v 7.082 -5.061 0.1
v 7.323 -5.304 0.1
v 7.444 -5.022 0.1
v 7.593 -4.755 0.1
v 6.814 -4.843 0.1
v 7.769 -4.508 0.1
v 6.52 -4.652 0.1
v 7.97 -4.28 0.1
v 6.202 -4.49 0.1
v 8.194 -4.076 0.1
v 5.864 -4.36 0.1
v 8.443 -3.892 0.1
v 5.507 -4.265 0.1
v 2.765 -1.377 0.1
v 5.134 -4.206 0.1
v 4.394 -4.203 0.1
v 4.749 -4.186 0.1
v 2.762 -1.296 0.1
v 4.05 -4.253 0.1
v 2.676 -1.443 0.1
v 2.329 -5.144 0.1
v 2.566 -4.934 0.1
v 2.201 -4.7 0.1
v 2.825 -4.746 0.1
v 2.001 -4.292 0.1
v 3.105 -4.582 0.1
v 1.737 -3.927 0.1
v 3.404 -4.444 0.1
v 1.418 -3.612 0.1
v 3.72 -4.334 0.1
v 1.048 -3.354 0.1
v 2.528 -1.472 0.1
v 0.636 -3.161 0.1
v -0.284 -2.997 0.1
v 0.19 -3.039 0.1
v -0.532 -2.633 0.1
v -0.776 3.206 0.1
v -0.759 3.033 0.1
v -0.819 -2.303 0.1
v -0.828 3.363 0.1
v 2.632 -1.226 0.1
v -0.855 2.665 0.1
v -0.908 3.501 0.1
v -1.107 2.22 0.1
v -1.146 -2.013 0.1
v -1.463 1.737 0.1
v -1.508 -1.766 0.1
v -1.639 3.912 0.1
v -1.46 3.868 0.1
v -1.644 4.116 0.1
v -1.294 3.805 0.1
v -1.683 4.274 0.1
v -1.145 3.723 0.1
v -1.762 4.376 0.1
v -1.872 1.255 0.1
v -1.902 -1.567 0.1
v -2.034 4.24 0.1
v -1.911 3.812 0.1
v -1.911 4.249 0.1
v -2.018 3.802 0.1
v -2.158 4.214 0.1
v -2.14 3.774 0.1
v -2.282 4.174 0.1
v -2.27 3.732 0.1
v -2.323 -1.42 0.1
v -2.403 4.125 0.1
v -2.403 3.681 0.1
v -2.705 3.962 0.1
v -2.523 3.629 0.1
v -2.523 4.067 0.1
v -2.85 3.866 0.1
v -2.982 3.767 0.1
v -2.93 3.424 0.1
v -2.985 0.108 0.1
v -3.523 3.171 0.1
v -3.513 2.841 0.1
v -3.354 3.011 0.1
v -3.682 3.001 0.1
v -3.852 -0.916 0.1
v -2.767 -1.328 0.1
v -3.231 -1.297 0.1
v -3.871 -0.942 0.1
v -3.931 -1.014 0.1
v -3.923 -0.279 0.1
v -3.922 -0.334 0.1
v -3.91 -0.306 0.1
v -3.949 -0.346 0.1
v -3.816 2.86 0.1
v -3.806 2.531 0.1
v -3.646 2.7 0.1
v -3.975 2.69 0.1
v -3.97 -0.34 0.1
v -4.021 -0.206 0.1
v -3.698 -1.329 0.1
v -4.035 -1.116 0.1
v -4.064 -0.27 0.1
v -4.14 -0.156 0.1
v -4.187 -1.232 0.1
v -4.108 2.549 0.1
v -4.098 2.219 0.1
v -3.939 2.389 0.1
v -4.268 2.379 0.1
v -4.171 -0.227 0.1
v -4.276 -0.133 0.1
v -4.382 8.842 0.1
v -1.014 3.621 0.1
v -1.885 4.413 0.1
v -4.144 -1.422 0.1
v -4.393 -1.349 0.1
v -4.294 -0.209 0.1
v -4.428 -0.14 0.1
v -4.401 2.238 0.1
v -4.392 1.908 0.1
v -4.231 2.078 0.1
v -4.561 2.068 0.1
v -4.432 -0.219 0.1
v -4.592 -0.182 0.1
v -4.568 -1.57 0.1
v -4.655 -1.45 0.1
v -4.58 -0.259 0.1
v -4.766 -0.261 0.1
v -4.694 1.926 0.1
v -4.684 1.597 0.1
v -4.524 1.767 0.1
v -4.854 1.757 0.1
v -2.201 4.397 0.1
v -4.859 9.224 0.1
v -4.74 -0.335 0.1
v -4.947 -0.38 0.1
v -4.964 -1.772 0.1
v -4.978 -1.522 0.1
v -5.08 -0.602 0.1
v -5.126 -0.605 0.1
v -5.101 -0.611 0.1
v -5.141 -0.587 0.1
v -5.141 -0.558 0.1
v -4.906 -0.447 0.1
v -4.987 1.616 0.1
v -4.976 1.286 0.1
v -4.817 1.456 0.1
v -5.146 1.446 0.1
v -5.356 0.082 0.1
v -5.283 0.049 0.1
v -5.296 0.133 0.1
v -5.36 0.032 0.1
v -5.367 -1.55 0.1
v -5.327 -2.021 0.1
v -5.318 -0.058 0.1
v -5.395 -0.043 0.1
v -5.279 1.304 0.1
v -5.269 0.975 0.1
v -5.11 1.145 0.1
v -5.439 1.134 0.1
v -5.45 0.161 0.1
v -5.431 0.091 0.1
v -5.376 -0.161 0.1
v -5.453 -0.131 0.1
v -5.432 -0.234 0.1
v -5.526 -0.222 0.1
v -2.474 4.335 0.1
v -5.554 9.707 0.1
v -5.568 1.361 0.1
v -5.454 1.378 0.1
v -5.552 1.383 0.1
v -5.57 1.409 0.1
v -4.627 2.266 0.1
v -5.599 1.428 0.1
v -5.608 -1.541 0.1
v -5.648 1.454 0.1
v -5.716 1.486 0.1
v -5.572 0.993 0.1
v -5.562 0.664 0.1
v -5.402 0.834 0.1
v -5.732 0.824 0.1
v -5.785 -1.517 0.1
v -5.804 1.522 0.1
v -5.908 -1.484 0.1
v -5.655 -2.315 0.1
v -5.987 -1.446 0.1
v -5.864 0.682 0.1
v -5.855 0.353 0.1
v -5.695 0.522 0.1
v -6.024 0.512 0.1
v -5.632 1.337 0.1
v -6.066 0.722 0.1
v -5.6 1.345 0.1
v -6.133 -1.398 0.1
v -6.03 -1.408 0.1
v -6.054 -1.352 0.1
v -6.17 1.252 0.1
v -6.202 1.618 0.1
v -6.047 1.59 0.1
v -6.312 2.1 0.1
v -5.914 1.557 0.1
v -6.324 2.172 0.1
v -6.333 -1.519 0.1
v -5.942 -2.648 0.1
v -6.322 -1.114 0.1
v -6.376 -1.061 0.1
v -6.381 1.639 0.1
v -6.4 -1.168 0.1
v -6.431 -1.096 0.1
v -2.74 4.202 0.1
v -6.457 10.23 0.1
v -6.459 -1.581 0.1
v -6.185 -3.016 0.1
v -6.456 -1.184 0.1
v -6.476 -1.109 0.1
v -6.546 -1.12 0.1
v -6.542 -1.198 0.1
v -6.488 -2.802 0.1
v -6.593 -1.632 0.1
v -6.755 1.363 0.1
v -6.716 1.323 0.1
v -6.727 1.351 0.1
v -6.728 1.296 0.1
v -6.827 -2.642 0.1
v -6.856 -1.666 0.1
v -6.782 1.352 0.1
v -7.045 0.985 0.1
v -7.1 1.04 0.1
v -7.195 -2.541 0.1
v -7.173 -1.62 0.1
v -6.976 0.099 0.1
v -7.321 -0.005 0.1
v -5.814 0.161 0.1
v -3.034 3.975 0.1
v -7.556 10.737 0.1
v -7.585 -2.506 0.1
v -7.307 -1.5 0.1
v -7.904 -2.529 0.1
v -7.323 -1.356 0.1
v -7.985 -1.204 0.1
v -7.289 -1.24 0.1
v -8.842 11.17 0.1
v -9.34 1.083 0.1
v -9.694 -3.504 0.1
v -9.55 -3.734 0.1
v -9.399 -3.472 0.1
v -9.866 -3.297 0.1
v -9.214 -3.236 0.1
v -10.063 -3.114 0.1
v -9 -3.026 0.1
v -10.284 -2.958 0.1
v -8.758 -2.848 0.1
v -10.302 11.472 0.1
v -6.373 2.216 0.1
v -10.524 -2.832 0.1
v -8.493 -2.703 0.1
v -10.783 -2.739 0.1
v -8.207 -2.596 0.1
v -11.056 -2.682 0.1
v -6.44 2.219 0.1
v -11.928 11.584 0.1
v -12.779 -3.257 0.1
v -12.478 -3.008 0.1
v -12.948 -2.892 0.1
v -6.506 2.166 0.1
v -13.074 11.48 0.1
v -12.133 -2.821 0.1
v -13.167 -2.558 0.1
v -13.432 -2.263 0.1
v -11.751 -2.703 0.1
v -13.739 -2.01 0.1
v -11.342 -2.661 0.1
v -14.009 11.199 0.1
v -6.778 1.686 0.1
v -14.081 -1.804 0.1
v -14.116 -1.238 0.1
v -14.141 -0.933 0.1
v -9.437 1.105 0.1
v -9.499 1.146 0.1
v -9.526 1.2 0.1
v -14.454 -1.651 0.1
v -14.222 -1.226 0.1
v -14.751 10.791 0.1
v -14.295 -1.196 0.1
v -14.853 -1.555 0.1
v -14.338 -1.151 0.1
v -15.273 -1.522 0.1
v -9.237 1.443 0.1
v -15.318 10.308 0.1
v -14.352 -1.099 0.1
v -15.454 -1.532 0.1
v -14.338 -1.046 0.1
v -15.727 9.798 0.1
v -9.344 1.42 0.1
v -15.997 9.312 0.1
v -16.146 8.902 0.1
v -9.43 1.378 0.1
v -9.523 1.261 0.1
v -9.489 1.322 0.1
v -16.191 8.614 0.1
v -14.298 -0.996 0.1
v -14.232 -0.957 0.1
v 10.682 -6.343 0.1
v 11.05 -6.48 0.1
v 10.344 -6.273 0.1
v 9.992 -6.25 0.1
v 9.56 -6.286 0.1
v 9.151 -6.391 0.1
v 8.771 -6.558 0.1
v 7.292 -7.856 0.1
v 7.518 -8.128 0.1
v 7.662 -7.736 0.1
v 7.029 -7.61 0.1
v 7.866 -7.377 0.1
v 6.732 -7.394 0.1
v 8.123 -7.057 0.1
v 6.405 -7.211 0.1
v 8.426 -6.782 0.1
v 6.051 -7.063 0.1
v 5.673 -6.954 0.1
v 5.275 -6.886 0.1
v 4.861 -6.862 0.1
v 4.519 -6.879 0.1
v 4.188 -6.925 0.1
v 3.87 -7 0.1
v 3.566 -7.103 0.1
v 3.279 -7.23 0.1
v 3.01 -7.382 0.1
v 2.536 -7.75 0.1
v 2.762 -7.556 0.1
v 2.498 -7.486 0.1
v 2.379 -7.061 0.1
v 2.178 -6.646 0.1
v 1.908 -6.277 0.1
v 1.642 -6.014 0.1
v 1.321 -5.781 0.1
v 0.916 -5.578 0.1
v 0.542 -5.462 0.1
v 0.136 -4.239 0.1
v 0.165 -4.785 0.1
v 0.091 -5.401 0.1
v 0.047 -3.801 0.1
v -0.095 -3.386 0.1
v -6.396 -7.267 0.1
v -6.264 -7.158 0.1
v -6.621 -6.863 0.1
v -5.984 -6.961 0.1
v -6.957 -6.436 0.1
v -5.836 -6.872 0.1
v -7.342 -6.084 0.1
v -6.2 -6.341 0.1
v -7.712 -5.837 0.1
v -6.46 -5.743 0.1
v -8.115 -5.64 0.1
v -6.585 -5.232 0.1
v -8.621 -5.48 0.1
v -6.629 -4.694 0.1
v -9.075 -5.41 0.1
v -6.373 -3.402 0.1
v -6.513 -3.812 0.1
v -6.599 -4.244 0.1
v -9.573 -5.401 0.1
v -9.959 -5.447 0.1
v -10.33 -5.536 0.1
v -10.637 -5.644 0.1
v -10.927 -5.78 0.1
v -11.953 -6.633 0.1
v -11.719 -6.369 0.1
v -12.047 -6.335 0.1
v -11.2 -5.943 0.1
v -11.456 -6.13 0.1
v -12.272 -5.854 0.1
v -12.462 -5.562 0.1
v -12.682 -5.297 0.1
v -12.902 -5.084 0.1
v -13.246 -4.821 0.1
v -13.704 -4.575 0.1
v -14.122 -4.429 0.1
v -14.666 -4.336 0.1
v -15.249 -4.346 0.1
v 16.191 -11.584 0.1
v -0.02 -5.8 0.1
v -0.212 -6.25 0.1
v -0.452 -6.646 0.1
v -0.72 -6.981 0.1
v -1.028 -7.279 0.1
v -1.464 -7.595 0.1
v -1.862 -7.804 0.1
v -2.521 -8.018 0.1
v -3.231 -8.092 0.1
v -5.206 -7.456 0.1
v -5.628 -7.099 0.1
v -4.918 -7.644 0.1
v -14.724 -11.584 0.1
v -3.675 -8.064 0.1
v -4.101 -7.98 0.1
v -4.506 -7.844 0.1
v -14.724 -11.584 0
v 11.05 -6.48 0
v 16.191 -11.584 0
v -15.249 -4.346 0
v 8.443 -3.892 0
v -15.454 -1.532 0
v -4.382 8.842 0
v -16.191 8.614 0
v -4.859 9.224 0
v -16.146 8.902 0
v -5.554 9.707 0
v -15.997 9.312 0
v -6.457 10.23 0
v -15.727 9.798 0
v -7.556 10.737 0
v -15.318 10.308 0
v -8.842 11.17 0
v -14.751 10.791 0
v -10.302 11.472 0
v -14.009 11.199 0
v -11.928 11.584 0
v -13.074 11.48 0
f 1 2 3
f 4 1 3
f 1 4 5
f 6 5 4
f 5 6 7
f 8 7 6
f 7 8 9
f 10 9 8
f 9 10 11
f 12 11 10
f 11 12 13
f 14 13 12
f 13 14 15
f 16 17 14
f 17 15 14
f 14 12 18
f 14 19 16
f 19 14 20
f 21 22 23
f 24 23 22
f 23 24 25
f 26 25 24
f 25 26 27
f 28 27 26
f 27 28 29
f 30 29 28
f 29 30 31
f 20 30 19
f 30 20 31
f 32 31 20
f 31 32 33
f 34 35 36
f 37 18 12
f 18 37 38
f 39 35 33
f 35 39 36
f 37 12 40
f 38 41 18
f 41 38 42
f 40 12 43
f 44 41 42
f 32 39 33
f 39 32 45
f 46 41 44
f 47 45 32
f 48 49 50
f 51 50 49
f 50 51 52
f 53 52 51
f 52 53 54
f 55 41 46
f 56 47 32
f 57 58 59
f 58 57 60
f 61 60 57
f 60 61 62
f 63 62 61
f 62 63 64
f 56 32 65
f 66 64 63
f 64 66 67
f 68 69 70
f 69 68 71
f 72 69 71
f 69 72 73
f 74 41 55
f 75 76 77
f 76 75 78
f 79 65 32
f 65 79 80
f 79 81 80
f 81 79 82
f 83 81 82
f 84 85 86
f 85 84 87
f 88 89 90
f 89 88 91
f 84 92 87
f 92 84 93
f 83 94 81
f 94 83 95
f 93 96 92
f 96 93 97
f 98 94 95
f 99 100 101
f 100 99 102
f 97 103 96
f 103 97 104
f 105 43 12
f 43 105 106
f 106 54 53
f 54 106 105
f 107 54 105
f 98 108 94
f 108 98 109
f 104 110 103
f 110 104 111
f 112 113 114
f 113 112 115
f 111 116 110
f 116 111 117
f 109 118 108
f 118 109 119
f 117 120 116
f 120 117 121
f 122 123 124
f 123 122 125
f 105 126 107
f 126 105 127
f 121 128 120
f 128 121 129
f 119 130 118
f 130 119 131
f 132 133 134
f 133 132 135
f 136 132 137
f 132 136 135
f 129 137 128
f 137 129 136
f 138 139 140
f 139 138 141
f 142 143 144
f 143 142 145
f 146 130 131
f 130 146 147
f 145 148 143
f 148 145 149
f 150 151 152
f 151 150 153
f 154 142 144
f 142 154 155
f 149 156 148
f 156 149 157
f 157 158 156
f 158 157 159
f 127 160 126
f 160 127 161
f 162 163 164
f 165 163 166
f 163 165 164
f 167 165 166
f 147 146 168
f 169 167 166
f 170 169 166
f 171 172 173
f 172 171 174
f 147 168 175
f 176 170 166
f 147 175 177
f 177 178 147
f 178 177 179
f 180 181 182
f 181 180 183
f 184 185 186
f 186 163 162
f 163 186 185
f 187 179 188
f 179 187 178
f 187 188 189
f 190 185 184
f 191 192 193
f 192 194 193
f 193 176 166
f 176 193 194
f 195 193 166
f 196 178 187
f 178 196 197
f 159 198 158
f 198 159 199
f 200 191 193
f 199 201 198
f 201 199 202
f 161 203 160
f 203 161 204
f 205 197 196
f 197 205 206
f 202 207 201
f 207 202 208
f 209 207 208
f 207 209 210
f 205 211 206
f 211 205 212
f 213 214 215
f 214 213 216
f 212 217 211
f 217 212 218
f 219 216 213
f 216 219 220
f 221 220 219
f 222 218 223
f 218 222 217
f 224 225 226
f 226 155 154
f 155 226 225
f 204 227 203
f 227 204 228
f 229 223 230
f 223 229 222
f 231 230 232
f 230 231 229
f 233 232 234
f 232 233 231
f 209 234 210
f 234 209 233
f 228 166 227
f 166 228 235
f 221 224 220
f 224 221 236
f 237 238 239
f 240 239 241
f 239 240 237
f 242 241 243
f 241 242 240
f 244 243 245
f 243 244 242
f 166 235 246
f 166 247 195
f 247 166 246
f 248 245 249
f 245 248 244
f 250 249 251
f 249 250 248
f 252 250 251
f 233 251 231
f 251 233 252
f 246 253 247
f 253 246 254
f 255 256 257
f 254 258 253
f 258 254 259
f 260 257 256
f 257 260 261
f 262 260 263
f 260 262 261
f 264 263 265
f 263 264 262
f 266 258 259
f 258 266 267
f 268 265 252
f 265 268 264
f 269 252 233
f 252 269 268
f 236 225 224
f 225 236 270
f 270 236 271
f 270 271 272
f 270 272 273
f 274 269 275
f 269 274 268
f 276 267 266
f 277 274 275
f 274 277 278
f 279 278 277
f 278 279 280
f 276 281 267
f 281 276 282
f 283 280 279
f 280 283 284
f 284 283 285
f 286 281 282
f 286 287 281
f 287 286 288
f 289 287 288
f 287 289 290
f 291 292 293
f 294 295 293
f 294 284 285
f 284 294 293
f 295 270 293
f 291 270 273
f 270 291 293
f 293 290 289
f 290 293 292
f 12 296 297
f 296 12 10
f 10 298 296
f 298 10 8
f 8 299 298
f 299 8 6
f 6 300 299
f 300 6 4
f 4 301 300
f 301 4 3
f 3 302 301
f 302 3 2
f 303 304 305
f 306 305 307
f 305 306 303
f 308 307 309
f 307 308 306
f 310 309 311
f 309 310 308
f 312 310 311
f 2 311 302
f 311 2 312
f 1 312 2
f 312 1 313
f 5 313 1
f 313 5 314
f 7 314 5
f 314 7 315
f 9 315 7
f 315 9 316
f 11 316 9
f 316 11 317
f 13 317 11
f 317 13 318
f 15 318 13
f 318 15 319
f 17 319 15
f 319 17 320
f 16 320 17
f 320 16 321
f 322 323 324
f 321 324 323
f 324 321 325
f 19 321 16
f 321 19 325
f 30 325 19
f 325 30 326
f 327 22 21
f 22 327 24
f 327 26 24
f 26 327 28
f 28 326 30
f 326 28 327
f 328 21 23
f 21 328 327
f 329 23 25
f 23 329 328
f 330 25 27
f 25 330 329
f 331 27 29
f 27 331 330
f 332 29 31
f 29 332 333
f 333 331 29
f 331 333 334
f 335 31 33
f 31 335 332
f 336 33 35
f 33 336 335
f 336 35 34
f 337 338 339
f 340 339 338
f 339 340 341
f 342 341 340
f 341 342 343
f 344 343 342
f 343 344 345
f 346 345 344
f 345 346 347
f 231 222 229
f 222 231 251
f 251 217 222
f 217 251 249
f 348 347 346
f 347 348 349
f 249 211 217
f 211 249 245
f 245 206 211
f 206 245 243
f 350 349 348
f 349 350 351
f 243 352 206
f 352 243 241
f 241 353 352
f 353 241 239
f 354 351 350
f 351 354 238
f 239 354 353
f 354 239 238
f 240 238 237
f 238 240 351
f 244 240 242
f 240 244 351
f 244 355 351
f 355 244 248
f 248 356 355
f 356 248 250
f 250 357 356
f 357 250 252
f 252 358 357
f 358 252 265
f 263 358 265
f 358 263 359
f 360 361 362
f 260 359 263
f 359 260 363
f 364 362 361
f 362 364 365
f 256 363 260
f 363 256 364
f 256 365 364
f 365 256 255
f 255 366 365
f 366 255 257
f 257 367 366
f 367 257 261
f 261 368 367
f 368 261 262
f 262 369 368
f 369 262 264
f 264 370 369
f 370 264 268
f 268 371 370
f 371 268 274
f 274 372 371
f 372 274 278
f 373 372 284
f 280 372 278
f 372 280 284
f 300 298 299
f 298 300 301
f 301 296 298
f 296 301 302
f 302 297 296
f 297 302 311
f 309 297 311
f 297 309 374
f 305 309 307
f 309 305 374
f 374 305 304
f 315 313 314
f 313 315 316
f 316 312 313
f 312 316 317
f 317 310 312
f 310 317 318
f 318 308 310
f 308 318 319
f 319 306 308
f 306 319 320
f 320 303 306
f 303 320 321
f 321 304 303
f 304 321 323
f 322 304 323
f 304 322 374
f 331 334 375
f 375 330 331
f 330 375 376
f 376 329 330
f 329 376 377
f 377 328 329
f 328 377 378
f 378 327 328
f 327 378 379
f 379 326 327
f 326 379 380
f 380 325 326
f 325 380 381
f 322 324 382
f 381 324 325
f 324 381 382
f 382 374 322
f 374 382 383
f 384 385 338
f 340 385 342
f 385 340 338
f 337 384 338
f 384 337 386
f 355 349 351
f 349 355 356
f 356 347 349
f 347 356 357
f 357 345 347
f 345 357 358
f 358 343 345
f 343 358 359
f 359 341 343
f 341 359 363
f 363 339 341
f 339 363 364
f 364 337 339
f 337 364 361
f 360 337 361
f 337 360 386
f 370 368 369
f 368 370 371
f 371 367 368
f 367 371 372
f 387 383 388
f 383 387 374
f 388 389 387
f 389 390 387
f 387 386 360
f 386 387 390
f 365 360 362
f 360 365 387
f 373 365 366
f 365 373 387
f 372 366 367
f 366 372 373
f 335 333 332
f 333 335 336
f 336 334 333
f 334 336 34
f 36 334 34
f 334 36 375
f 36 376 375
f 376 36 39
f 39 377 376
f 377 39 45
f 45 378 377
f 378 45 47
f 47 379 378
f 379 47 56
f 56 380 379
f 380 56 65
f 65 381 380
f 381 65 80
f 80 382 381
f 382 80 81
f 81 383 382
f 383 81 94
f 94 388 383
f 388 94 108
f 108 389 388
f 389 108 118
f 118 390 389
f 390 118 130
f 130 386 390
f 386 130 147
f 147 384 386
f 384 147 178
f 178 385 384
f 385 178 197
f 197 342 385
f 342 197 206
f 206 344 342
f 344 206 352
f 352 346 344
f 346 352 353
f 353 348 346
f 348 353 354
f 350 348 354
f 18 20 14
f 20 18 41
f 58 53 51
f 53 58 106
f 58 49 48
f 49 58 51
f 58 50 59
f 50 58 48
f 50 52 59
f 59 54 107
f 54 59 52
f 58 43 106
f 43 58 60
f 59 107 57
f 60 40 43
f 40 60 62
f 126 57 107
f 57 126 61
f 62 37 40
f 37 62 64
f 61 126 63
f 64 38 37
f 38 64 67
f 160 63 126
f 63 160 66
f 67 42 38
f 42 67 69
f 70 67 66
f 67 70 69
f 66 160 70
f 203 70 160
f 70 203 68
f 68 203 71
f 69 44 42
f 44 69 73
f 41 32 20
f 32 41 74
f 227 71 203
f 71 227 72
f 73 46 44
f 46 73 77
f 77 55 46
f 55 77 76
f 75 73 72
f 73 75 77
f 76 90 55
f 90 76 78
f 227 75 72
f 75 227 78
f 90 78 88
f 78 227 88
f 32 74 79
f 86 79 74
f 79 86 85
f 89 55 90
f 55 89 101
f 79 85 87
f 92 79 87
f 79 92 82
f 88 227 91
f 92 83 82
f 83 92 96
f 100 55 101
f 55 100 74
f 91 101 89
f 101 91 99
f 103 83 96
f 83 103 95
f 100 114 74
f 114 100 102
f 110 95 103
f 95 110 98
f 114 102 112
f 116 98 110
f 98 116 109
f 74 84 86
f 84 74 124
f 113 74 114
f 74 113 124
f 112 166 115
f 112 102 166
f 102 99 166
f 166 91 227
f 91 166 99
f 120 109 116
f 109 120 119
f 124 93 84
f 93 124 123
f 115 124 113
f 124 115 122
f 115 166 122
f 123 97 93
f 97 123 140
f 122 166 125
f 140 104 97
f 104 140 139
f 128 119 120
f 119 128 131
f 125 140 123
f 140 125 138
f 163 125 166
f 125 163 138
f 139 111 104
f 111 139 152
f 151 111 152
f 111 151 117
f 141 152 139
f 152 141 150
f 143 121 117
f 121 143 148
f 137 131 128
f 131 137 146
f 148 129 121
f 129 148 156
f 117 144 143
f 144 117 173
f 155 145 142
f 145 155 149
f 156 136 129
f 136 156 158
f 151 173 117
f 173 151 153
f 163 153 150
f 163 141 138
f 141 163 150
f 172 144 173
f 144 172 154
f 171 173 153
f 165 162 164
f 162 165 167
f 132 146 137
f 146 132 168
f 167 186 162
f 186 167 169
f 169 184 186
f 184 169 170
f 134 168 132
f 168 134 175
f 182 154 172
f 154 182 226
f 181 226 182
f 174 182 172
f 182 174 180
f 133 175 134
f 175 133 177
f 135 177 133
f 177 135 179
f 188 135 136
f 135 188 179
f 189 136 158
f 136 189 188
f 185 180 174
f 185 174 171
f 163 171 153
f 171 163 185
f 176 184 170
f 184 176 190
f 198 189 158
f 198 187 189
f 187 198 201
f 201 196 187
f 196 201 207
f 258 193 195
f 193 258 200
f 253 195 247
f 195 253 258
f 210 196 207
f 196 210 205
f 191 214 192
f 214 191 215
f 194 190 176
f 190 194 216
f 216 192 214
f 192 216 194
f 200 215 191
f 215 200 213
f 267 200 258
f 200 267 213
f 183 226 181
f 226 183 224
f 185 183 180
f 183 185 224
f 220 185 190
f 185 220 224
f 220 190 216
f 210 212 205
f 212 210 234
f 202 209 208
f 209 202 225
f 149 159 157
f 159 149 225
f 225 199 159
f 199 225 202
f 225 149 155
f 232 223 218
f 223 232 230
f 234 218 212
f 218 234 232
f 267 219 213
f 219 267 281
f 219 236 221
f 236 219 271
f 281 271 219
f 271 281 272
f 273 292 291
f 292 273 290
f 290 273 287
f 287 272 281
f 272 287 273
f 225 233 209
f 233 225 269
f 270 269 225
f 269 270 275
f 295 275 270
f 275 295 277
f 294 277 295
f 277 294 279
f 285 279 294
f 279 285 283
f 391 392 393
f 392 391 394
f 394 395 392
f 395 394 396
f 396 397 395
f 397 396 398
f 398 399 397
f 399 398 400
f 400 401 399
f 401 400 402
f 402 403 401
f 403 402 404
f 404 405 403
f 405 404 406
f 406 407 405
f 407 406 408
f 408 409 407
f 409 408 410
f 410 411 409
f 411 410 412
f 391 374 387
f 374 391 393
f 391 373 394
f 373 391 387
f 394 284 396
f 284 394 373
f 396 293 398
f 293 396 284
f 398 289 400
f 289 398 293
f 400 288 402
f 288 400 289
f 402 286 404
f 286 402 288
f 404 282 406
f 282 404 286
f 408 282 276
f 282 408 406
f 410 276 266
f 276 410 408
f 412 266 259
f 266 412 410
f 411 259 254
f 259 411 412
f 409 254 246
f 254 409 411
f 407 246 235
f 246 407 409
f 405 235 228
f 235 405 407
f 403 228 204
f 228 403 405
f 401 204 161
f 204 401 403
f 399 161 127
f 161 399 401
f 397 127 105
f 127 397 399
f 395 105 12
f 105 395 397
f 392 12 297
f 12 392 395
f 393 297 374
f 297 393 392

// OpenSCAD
use <../lib.scad>
use <4105242a.scad>
function ldraw_lib__4105242b() = [
// 0 Sticker  2.9 x  4.0 with White Airplane, Yellow Disc and Sky Scene - Left
// 0 Name: 4105242b.dat
// 0 Author: Damien Roux [Darats]
// 0 !LDRAW_ORG Part UPDATE 2015-02
// 0 !LICENSE Licensed under CC BY 2.0 and CC BY 4.0 : see CAreadme.txt
// 
// 0 BFC CERTIFY CCW
  [0,"BFC","CERTIFY"],
  [0,"BFC","CCW"],
// 
// 0 !KEYWORDS Set 1817
// 
// 0 !HISTORY 2015-12-30 [PTadmin] Official Update 2015-02
// 
// 
// 1 16 0 0 0 -1 0 0 0 1 0 0 0 1 4105242a.dat
  [1,16,0,0,0,-1,0,0,0,1,0,0,0,1, ldraw_lib__4105242a()],
];
makepoly(ldraw_lib__4105242b(), line=0.2);
